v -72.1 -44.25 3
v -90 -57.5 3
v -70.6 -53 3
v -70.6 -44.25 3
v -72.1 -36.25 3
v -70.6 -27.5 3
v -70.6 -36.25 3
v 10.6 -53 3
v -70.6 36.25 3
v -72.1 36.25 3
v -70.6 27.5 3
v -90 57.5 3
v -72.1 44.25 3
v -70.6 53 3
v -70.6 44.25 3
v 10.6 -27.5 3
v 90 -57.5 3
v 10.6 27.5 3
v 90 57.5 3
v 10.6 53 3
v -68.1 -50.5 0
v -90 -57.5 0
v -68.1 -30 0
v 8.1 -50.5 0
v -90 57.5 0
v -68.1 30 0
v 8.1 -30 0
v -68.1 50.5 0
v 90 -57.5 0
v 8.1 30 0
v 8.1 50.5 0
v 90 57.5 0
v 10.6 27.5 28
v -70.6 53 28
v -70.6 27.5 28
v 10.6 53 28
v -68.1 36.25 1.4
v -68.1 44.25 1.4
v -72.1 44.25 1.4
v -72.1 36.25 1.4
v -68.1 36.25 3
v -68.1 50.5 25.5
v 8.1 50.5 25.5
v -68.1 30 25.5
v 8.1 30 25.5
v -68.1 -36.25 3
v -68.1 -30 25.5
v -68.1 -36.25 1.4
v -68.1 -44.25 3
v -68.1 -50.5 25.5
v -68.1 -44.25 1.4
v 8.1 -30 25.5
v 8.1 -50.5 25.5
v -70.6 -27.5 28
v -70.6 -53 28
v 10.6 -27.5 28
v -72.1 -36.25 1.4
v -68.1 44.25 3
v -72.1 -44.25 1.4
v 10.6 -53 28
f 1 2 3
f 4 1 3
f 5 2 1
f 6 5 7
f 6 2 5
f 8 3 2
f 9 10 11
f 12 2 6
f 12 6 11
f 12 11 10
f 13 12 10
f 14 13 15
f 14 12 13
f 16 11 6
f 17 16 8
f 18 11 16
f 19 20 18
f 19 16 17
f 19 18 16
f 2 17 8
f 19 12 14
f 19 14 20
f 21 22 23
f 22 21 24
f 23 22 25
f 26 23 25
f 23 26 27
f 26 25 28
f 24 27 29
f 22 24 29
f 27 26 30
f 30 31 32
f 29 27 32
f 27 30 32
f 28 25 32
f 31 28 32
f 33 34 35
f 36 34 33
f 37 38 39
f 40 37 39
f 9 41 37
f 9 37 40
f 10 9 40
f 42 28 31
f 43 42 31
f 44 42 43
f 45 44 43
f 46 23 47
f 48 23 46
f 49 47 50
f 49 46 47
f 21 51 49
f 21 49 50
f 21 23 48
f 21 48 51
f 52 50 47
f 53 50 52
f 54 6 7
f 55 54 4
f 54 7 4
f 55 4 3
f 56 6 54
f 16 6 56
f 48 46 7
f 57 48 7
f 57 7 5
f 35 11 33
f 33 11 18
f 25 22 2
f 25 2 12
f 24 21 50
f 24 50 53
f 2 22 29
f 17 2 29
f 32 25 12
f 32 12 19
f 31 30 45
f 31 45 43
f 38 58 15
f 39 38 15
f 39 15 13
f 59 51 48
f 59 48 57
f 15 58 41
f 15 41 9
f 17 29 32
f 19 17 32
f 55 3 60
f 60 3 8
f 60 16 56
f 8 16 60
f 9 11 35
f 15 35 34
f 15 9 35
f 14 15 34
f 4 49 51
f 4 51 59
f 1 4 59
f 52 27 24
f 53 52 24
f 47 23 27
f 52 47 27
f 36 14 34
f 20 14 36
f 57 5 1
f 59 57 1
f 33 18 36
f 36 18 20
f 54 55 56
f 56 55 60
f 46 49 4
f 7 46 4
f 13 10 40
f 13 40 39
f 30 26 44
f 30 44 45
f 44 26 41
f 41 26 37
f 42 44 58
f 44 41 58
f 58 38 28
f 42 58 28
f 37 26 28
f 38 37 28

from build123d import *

# Parameters (mm, degrees)
SKETCH_1_W          = 180
SKETCH_1_H          = 115
EXTRUDE_1_DEPTH     = 3
CUT_EXTRUDE_3_REACH = 108.842
SKETCH_7_W          = 76.2
SKETCH_7_H          = 20.5
SKETCH_8_W          = 81.2
SKETCH_8_H          = 25.5
SKETCH_8_W_2        = 76.2
SKETCH_8_H_2        = 20.5
EXTRUDE_2_DEPTH     = 25
SKETCH_9_W          = 81.2
SKETCH_9_H          = 25.5
EXTRUDE_3_DEPTH     = 2.5
CUT_EXTRUDE_START   = -3
SKETCH_4_W          = 4
SKETCH_4_H          = 8
CUT_EXTRUDE_2_DEPTH = 1.6


with BuildPart() as part:
    # 草图1 → 凸台-拉伸1 (new body)
    with BuildSketch(Plane.XY):
        Rectangle(SKETCH_1_W, SKETCH_1_H)
    extrude(amount=EXTRUDE_1_DEPTH)

    # 草图7 → 电池位切除-拉伸3 (cut, up to next)
    with BuildSketch(Plane(origin=(0, 0, 0), x_dir=(-1, 0, 0), z_dir=(0, 0, -1)), mode=Mode.PRIVATE) as cut_extrude_3_sk1:
        with Locations((30, 40.25)):
            Rectangle(SKETCH_7_W, SKETCH_7_H)
    cut_extrude_3_tool1 = extrude(cut_extrude_3_sk1.sketch, amount=-CUT_EXTRUDE_3_REACH, mode=Mode.PRIVATE) & part.part
    cut_extrude_3 = cut_extrude_3_tool1.solids().sort_by_distance((-30, 40.25, 0))[0]
    add(cut_extrude_3, mode=Mode.SUBTRACT)

    # 草图8 → 凸台-拉伸2 (add)
    with BuildSketch(Plane.XY.offset(3)):
        with Locations((-30, 40.25)):
            Rectangle(SKETCH_8_W, SKETCH_8_H)
        with Locations((-30, 40.25)):
            Rectangle(SKETCH_8_W_2, SKETCH_8_H_2, mode=Mode.SUBTRACT)
    extrude_2 = extrude(amount=EXTRUDE_2_DEPTH)

    # 草图9 → 凸台-拉伸3 (add)
    with BuildSketch(Plane.XY.offset(28)):
        with Locations((-30, 40.25)):
            Rectangle(SKETCH_9_W, SKETCH_9_H)
    extrude_3 = extrude(amount=-EXTRUDE_3_DEPTH)

    # 草图4 → 切除-拉伸2 (cut)
    with BuildSketch(Plane(origin=(0, 0, 0), x_dir=(-1, 0, 0), z_dir=(0, 0, -1)).offset(CUT_EXTRUDE_START)):
        with Locations((70.1, 40.25)):
            Rectangle(SKETCH_4_W, SKETCH_4_H)
    cut_extrude_2 = extrude(amount=CUT_EXTRUDE_2_DEPTH, mode=Mode.SUBTRACT)

    # 镜向1: 电池位切除-拉伸3, 凸台-拉伸2, 凸台-拉伸3, 切除-拉伸2 across plane
    add(cut_extrude_3.mirror(Plane.ZX), mode=Mode.SUBTRACT)
    add(extrude_2.mirror(Plane.ZX))
    add(extrude_3.mirror(Plane.ZX))
    add(cut_extrude_2.mirror(Plane.ZX), mode=Mode.SUBTRACT)


solid = part.part
